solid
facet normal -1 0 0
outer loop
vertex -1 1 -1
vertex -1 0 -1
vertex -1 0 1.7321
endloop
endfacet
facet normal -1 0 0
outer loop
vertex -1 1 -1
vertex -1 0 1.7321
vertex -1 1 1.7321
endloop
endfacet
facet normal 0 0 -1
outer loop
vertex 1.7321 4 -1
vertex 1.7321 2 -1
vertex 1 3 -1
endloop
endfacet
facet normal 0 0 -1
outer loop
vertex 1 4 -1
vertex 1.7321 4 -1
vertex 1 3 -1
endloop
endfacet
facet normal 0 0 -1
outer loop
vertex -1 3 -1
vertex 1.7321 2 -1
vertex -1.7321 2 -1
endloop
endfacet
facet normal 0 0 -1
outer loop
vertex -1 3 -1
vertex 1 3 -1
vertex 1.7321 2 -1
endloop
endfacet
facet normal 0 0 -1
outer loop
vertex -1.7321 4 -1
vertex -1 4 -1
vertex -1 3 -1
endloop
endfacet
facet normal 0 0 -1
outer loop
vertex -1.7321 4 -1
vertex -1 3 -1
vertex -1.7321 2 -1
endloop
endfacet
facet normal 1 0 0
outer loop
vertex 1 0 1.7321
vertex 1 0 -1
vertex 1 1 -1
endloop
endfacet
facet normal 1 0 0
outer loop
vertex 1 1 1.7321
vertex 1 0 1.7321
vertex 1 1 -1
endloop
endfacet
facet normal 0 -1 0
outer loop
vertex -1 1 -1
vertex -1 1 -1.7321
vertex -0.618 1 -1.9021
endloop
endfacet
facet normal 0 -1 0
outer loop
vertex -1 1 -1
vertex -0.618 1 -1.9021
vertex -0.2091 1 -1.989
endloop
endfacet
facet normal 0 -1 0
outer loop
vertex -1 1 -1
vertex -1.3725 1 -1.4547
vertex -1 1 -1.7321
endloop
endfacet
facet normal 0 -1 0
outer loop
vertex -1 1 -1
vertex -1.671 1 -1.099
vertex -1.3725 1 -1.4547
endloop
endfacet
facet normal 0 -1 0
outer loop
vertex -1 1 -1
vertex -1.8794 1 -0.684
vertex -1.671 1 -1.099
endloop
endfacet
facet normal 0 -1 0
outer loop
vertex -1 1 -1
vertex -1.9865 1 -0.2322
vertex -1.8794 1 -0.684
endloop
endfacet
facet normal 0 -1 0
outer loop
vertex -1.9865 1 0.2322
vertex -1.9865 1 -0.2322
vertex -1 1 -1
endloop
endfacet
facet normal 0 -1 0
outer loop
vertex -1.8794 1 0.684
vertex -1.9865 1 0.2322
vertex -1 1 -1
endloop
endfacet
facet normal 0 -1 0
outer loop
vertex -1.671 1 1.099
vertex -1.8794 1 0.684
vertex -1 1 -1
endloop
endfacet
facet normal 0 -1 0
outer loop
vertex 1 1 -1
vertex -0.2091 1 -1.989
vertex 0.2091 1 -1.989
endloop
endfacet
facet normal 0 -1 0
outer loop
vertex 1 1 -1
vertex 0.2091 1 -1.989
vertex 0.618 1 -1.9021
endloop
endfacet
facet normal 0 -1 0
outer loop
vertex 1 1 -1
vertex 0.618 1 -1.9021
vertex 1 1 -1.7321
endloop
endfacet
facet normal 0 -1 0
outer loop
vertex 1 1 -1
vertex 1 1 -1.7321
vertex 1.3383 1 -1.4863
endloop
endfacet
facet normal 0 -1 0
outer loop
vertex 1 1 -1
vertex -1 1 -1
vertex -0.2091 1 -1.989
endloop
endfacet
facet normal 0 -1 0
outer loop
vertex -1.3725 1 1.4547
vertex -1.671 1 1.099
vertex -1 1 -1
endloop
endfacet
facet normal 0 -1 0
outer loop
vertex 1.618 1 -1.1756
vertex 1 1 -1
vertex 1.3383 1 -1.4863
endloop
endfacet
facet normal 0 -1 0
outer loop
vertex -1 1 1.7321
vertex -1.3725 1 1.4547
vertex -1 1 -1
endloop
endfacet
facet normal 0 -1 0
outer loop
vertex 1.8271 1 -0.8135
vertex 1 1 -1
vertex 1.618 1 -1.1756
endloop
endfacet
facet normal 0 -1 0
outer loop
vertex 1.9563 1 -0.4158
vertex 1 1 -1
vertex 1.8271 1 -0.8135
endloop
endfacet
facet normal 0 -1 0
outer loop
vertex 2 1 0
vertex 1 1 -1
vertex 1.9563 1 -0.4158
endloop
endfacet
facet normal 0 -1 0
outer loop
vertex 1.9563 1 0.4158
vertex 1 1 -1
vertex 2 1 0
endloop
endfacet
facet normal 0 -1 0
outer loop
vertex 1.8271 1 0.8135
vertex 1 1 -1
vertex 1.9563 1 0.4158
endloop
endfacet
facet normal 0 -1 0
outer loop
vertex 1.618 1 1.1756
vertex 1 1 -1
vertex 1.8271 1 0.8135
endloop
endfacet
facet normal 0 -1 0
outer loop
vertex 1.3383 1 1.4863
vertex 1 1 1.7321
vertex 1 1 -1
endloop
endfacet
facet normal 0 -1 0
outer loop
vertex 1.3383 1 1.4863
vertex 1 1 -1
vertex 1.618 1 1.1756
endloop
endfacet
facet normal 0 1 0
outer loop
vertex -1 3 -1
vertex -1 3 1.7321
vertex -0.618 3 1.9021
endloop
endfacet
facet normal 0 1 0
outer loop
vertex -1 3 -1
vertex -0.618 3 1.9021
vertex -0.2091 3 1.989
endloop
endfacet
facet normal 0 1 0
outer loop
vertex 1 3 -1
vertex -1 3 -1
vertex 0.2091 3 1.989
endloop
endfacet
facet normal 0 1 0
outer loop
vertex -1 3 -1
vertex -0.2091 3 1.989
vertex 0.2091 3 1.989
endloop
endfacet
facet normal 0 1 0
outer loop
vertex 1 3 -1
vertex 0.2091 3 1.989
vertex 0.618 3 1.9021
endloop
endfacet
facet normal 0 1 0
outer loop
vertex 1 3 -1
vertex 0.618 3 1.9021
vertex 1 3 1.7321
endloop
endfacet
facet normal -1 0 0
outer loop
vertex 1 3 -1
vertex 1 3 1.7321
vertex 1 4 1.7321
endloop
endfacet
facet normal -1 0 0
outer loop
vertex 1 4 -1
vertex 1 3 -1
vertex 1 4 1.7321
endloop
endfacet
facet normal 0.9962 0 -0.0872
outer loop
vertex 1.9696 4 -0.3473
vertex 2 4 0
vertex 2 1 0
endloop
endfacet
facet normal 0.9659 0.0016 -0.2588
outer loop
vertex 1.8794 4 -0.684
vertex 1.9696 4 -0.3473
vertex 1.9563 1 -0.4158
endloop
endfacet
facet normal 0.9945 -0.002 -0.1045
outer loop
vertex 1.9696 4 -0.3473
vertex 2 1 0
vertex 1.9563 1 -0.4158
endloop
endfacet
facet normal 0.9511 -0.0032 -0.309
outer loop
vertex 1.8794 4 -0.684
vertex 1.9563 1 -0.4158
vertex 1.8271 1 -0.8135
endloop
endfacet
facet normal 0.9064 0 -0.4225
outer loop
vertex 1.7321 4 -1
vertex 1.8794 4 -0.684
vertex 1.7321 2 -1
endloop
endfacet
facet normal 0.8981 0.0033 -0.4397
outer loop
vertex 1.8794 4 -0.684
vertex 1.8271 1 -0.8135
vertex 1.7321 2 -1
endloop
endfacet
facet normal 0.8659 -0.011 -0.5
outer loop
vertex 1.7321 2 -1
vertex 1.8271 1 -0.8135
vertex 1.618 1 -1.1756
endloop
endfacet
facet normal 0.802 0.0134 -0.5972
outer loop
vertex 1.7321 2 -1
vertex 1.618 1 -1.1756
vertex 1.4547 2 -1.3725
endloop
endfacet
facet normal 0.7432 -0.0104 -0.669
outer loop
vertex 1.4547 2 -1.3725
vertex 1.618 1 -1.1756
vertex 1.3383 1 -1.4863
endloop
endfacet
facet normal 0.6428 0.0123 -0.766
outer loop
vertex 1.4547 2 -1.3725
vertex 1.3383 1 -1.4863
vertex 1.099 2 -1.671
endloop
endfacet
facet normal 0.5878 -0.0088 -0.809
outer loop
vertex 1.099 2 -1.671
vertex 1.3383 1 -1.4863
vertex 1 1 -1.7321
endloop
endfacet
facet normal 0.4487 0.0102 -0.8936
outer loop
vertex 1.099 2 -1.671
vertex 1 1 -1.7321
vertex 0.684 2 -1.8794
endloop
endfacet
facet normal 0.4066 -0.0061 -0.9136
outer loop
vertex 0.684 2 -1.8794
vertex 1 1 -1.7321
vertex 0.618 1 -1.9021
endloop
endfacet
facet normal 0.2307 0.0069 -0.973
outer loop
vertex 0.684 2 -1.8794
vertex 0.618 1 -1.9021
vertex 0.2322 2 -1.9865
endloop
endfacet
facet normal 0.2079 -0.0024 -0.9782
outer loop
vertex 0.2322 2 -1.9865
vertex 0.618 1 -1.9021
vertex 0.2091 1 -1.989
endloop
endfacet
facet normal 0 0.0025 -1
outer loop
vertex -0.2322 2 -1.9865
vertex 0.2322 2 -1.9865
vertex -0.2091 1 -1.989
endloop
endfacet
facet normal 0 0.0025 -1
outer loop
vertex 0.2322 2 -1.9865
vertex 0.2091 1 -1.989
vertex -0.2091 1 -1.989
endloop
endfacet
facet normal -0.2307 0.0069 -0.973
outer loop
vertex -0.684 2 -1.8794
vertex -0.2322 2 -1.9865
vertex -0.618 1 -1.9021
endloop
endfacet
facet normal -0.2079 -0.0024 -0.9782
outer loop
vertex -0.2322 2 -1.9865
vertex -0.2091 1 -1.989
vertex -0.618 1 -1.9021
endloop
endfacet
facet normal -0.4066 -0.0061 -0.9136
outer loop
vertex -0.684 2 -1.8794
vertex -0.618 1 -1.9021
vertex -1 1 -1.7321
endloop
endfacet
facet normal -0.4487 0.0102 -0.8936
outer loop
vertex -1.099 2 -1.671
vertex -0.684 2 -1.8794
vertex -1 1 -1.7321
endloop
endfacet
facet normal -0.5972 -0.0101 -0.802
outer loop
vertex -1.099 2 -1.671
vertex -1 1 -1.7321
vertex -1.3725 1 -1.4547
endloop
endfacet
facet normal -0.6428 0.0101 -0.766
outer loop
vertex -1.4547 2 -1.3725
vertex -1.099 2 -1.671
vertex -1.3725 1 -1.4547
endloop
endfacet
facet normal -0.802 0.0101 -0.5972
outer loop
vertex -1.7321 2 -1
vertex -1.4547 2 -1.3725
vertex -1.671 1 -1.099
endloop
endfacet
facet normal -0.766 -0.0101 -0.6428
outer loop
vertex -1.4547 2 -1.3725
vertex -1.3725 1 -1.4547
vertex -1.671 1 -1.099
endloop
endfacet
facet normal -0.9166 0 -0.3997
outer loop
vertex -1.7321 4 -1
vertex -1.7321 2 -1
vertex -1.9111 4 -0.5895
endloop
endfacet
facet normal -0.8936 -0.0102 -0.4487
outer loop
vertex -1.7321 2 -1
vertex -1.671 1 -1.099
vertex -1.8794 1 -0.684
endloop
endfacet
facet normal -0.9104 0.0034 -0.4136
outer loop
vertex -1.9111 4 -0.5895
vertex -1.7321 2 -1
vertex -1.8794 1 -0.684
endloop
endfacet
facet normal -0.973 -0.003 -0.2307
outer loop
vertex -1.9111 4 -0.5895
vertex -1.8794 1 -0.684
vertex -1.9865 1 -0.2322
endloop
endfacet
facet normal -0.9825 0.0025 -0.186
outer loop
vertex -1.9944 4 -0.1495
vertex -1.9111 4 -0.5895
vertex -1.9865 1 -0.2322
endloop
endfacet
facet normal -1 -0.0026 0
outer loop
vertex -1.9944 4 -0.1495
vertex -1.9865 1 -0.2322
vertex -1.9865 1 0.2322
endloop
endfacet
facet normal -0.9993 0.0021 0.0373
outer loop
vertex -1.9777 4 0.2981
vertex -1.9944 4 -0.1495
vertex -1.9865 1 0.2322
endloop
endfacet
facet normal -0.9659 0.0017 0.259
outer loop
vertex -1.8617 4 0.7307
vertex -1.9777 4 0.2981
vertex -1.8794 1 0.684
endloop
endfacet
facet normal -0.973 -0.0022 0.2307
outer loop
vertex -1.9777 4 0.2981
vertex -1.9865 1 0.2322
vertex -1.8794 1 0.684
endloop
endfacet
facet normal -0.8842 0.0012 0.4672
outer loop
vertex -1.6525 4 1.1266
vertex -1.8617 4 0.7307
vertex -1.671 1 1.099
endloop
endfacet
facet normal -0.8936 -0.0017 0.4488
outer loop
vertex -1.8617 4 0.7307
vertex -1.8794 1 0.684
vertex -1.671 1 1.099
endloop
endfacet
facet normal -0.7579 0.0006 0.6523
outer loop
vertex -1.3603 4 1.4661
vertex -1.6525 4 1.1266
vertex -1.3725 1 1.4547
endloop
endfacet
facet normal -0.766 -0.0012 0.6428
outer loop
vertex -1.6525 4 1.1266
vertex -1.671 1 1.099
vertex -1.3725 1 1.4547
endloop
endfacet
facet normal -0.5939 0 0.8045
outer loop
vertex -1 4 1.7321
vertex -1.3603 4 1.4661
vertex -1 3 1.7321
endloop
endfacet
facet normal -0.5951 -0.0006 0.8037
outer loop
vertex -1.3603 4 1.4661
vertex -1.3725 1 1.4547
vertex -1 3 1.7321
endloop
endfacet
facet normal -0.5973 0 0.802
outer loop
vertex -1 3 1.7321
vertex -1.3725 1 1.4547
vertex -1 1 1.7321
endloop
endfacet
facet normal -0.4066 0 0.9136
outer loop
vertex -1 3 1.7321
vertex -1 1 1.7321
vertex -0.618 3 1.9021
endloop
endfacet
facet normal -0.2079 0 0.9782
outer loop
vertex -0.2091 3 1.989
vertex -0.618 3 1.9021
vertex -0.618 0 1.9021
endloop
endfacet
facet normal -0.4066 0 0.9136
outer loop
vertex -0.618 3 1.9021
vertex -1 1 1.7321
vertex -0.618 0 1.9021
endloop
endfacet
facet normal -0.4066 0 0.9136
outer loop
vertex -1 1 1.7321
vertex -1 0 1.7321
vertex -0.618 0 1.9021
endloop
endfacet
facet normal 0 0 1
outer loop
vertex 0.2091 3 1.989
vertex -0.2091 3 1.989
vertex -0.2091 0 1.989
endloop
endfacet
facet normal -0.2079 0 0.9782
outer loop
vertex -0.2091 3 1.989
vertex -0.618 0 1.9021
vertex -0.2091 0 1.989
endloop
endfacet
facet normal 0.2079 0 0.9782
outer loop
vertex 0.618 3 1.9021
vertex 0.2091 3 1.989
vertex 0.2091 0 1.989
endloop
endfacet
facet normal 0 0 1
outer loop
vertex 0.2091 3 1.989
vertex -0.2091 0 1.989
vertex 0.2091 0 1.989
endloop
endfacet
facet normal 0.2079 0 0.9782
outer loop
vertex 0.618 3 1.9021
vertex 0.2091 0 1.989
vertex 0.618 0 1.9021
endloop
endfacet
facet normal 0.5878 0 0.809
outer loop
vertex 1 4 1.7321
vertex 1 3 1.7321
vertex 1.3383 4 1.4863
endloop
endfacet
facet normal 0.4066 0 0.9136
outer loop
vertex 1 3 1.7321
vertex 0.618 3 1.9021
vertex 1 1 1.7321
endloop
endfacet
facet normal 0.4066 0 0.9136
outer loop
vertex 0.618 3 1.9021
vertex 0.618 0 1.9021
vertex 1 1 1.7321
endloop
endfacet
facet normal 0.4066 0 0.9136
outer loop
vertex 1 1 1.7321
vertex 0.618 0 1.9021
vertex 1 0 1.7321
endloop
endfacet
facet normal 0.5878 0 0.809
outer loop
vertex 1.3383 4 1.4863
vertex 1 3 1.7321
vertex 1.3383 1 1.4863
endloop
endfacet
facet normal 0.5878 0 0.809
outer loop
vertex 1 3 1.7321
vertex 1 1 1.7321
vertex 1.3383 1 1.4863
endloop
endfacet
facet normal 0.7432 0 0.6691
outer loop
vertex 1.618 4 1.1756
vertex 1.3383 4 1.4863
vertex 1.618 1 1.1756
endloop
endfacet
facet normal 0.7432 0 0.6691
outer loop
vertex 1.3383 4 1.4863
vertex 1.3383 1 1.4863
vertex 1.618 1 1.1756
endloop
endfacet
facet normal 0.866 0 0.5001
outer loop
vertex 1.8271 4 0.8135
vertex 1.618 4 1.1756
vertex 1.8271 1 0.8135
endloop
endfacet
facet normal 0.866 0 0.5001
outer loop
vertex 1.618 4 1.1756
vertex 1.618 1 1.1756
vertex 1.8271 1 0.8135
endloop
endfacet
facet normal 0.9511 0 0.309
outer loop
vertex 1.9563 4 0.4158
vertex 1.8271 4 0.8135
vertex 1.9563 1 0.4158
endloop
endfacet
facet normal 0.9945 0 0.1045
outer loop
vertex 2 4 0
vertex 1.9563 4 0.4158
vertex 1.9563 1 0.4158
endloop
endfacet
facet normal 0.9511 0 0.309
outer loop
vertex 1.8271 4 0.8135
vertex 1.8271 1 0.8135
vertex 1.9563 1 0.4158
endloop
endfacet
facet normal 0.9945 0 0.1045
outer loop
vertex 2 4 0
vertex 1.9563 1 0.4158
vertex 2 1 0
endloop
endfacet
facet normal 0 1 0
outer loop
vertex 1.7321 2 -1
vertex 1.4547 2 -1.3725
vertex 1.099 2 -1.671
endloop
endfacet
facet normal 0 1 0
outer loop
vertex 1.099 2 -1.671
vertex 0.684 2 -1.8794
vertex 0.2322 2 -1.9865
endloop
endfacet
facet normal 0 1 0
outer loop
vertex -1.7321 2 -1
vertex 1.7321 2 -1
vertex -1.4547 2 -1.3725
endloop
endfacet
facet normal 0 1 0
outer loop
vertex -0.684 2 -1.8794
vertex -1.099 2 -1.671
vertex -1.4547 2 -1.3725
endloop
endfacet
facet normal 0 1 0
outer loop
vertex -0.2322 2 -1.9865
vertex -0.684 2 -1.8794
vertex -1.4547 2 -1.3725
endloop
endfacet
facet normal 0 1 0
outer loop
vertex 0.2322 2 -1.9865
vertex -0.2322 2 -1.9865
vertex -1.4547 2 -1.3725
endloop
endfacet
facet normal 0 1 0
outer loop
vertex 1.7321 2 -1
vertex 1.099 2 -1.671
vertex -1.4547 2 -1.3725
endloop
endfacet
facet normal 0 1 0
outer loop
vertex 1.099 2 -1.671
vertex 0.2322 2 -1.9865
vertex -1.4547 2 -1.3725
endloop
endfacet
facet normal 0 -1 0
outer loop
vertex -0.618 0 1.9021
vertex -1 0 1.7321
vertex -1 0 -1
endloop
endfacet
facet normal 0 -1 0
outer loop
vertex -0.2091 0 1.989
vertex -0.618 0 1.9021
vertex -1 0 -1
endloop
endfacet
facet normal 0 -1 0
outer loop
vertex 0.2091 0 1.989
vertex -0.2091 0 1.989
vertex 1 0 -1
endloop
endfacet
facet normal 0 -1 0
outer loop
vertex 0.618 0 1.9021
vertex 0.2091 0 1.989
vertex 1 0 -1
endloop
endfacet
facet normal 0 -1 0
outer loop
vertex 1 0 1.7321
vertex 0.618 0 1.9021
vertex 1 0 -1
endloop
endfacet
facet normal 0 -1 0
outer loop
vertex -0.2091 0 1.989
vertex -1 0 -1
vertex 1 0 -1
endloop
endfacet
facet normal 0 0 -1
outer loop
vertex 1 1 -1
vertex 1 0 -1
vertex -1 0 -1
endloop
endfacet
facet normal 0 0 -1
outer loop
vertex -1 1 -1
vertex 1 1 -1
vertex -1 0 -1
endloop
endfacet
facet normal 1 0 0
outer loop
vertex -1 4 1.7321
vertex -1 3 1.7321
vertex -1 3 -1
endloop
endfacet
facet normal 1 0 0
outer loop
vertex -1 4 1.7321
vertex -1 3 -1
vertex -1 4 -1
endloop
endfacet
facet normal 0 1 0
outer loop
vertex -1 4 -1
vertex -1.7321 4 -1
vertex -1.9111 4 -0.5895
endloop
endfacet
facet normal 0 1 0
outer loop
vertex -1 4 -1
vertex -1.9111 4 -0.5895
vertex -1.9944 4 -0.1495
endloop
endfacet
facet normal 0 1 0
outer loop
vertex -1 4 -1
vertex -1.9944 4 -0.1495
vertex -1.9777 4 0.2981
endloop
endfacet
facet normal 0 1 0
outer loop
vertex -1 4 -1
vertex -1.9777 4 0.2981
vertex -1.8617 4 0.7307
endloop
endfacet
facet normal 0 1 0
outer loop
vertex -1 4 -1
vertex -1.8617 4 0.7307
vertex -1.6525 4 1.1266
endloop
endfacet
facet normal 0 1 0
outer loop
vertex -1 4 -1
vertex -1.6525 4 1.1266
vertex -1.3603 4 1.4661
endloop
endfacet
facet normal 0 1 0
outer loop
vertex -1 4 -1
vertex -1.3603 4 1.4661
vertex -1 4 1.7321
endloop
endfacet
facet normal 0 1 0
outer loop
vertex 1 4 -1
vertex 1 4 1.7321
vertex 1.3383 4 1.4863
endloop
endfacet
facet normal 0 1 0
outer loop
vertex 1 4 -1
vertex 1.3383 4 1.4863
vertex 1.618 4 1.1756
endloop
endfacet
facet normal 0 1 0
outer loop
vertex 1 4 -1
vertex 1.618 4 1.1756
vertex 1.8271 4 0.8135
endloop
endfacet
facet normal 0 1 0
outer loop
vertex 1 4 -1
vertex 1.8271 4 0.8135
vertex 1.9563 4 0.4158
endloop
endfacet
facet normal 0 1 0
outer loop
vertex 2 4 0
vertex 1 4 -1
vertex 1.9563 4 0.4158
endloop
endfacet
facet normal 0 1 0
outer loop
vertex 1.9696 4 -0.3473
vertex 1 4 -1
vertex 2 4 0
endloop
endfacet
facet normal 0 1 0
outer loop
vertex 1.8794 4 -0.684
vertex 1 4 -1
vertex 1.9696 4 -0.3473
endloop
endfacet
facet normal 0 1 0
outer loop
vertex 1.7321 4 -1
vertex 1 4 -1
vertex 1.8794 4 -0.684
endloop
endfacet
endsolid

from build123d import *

# Parameters (mm, degrees)
SKETCH1_R           = 2
BOSS_EXTRUDE1_DEPTH = 4
SKETCH2_W           = 1
SKETCH2_H           = 1
SKETCH2_W_2         = 2
CUT_EXTRUDE1_DEPTH  = 5
CUT_EXTRUDE2_DEPTH  = 2
CUT_EXTRUDE3_DEPTH  = 1


with BuildPart() as part:
    # Sketch1 → Boss-Extrude1 (new body)
    with BuildSketch(Plane(origin=(0, 0, 0), x_dir=(1, 0, 0), z_dir=(0, 1, 0))):
        Circle(SKETCH1_R)
    extrude(amount=BOSS_EXTRUDE1_DEPTH)

    # Sketch2 → Cut-Extrude1 (cut, symmetric)
    with BuildSketch(Plane.XY):
        with Locations((-1.5, 0.5)):
            Rectangle(SKETCH2_W, SKETCH2_H)
        with Locations((1.5, 0.5)):
            Rectangle(SKETCH2_W, SKETCH2_H)
        with Locations((0, 3.5)):
            Rectangle(SKETCH2_W_2, SKETCH2_H)
    extrude(amount=CUT_EXTRUDE1_DEPTH, both=True, mode=Mode.SUBTRACT)

    # Sketch3 → Cut-Extrude2 (cut)
    with BuildSketch(Plane(origin=(0, 4, 0), x_dir=(1, 0, 0), z_dir=(0, 1, 0))):
        with BuildLine():
            Line((1.732050808, 1), (-1.732050808, 1))
            ThreePointArc((-1.732050808, 1), (0, 2), (1.732050808, 1))
        make_face()
    extrude(amount=-CUT_EXTRUDE2_DEPTH, mode=Mode.SUBTRACT)

    # Sketch4 → Cut-Extrude3 (cut)
    with BuildSketch(Plane.XZ):
        with BuildLine():
            Line((1.732050808, -1), (-1.732050808, -1))
            ThreePointArc((-1.732050808, -1), (0, -2), (1.732050808, -1))
        make_face()
    extrude(amount=-CUT_EXTRUDE3_DEPTH, mode=Mode.SUBTRACT)


solid = part.part
